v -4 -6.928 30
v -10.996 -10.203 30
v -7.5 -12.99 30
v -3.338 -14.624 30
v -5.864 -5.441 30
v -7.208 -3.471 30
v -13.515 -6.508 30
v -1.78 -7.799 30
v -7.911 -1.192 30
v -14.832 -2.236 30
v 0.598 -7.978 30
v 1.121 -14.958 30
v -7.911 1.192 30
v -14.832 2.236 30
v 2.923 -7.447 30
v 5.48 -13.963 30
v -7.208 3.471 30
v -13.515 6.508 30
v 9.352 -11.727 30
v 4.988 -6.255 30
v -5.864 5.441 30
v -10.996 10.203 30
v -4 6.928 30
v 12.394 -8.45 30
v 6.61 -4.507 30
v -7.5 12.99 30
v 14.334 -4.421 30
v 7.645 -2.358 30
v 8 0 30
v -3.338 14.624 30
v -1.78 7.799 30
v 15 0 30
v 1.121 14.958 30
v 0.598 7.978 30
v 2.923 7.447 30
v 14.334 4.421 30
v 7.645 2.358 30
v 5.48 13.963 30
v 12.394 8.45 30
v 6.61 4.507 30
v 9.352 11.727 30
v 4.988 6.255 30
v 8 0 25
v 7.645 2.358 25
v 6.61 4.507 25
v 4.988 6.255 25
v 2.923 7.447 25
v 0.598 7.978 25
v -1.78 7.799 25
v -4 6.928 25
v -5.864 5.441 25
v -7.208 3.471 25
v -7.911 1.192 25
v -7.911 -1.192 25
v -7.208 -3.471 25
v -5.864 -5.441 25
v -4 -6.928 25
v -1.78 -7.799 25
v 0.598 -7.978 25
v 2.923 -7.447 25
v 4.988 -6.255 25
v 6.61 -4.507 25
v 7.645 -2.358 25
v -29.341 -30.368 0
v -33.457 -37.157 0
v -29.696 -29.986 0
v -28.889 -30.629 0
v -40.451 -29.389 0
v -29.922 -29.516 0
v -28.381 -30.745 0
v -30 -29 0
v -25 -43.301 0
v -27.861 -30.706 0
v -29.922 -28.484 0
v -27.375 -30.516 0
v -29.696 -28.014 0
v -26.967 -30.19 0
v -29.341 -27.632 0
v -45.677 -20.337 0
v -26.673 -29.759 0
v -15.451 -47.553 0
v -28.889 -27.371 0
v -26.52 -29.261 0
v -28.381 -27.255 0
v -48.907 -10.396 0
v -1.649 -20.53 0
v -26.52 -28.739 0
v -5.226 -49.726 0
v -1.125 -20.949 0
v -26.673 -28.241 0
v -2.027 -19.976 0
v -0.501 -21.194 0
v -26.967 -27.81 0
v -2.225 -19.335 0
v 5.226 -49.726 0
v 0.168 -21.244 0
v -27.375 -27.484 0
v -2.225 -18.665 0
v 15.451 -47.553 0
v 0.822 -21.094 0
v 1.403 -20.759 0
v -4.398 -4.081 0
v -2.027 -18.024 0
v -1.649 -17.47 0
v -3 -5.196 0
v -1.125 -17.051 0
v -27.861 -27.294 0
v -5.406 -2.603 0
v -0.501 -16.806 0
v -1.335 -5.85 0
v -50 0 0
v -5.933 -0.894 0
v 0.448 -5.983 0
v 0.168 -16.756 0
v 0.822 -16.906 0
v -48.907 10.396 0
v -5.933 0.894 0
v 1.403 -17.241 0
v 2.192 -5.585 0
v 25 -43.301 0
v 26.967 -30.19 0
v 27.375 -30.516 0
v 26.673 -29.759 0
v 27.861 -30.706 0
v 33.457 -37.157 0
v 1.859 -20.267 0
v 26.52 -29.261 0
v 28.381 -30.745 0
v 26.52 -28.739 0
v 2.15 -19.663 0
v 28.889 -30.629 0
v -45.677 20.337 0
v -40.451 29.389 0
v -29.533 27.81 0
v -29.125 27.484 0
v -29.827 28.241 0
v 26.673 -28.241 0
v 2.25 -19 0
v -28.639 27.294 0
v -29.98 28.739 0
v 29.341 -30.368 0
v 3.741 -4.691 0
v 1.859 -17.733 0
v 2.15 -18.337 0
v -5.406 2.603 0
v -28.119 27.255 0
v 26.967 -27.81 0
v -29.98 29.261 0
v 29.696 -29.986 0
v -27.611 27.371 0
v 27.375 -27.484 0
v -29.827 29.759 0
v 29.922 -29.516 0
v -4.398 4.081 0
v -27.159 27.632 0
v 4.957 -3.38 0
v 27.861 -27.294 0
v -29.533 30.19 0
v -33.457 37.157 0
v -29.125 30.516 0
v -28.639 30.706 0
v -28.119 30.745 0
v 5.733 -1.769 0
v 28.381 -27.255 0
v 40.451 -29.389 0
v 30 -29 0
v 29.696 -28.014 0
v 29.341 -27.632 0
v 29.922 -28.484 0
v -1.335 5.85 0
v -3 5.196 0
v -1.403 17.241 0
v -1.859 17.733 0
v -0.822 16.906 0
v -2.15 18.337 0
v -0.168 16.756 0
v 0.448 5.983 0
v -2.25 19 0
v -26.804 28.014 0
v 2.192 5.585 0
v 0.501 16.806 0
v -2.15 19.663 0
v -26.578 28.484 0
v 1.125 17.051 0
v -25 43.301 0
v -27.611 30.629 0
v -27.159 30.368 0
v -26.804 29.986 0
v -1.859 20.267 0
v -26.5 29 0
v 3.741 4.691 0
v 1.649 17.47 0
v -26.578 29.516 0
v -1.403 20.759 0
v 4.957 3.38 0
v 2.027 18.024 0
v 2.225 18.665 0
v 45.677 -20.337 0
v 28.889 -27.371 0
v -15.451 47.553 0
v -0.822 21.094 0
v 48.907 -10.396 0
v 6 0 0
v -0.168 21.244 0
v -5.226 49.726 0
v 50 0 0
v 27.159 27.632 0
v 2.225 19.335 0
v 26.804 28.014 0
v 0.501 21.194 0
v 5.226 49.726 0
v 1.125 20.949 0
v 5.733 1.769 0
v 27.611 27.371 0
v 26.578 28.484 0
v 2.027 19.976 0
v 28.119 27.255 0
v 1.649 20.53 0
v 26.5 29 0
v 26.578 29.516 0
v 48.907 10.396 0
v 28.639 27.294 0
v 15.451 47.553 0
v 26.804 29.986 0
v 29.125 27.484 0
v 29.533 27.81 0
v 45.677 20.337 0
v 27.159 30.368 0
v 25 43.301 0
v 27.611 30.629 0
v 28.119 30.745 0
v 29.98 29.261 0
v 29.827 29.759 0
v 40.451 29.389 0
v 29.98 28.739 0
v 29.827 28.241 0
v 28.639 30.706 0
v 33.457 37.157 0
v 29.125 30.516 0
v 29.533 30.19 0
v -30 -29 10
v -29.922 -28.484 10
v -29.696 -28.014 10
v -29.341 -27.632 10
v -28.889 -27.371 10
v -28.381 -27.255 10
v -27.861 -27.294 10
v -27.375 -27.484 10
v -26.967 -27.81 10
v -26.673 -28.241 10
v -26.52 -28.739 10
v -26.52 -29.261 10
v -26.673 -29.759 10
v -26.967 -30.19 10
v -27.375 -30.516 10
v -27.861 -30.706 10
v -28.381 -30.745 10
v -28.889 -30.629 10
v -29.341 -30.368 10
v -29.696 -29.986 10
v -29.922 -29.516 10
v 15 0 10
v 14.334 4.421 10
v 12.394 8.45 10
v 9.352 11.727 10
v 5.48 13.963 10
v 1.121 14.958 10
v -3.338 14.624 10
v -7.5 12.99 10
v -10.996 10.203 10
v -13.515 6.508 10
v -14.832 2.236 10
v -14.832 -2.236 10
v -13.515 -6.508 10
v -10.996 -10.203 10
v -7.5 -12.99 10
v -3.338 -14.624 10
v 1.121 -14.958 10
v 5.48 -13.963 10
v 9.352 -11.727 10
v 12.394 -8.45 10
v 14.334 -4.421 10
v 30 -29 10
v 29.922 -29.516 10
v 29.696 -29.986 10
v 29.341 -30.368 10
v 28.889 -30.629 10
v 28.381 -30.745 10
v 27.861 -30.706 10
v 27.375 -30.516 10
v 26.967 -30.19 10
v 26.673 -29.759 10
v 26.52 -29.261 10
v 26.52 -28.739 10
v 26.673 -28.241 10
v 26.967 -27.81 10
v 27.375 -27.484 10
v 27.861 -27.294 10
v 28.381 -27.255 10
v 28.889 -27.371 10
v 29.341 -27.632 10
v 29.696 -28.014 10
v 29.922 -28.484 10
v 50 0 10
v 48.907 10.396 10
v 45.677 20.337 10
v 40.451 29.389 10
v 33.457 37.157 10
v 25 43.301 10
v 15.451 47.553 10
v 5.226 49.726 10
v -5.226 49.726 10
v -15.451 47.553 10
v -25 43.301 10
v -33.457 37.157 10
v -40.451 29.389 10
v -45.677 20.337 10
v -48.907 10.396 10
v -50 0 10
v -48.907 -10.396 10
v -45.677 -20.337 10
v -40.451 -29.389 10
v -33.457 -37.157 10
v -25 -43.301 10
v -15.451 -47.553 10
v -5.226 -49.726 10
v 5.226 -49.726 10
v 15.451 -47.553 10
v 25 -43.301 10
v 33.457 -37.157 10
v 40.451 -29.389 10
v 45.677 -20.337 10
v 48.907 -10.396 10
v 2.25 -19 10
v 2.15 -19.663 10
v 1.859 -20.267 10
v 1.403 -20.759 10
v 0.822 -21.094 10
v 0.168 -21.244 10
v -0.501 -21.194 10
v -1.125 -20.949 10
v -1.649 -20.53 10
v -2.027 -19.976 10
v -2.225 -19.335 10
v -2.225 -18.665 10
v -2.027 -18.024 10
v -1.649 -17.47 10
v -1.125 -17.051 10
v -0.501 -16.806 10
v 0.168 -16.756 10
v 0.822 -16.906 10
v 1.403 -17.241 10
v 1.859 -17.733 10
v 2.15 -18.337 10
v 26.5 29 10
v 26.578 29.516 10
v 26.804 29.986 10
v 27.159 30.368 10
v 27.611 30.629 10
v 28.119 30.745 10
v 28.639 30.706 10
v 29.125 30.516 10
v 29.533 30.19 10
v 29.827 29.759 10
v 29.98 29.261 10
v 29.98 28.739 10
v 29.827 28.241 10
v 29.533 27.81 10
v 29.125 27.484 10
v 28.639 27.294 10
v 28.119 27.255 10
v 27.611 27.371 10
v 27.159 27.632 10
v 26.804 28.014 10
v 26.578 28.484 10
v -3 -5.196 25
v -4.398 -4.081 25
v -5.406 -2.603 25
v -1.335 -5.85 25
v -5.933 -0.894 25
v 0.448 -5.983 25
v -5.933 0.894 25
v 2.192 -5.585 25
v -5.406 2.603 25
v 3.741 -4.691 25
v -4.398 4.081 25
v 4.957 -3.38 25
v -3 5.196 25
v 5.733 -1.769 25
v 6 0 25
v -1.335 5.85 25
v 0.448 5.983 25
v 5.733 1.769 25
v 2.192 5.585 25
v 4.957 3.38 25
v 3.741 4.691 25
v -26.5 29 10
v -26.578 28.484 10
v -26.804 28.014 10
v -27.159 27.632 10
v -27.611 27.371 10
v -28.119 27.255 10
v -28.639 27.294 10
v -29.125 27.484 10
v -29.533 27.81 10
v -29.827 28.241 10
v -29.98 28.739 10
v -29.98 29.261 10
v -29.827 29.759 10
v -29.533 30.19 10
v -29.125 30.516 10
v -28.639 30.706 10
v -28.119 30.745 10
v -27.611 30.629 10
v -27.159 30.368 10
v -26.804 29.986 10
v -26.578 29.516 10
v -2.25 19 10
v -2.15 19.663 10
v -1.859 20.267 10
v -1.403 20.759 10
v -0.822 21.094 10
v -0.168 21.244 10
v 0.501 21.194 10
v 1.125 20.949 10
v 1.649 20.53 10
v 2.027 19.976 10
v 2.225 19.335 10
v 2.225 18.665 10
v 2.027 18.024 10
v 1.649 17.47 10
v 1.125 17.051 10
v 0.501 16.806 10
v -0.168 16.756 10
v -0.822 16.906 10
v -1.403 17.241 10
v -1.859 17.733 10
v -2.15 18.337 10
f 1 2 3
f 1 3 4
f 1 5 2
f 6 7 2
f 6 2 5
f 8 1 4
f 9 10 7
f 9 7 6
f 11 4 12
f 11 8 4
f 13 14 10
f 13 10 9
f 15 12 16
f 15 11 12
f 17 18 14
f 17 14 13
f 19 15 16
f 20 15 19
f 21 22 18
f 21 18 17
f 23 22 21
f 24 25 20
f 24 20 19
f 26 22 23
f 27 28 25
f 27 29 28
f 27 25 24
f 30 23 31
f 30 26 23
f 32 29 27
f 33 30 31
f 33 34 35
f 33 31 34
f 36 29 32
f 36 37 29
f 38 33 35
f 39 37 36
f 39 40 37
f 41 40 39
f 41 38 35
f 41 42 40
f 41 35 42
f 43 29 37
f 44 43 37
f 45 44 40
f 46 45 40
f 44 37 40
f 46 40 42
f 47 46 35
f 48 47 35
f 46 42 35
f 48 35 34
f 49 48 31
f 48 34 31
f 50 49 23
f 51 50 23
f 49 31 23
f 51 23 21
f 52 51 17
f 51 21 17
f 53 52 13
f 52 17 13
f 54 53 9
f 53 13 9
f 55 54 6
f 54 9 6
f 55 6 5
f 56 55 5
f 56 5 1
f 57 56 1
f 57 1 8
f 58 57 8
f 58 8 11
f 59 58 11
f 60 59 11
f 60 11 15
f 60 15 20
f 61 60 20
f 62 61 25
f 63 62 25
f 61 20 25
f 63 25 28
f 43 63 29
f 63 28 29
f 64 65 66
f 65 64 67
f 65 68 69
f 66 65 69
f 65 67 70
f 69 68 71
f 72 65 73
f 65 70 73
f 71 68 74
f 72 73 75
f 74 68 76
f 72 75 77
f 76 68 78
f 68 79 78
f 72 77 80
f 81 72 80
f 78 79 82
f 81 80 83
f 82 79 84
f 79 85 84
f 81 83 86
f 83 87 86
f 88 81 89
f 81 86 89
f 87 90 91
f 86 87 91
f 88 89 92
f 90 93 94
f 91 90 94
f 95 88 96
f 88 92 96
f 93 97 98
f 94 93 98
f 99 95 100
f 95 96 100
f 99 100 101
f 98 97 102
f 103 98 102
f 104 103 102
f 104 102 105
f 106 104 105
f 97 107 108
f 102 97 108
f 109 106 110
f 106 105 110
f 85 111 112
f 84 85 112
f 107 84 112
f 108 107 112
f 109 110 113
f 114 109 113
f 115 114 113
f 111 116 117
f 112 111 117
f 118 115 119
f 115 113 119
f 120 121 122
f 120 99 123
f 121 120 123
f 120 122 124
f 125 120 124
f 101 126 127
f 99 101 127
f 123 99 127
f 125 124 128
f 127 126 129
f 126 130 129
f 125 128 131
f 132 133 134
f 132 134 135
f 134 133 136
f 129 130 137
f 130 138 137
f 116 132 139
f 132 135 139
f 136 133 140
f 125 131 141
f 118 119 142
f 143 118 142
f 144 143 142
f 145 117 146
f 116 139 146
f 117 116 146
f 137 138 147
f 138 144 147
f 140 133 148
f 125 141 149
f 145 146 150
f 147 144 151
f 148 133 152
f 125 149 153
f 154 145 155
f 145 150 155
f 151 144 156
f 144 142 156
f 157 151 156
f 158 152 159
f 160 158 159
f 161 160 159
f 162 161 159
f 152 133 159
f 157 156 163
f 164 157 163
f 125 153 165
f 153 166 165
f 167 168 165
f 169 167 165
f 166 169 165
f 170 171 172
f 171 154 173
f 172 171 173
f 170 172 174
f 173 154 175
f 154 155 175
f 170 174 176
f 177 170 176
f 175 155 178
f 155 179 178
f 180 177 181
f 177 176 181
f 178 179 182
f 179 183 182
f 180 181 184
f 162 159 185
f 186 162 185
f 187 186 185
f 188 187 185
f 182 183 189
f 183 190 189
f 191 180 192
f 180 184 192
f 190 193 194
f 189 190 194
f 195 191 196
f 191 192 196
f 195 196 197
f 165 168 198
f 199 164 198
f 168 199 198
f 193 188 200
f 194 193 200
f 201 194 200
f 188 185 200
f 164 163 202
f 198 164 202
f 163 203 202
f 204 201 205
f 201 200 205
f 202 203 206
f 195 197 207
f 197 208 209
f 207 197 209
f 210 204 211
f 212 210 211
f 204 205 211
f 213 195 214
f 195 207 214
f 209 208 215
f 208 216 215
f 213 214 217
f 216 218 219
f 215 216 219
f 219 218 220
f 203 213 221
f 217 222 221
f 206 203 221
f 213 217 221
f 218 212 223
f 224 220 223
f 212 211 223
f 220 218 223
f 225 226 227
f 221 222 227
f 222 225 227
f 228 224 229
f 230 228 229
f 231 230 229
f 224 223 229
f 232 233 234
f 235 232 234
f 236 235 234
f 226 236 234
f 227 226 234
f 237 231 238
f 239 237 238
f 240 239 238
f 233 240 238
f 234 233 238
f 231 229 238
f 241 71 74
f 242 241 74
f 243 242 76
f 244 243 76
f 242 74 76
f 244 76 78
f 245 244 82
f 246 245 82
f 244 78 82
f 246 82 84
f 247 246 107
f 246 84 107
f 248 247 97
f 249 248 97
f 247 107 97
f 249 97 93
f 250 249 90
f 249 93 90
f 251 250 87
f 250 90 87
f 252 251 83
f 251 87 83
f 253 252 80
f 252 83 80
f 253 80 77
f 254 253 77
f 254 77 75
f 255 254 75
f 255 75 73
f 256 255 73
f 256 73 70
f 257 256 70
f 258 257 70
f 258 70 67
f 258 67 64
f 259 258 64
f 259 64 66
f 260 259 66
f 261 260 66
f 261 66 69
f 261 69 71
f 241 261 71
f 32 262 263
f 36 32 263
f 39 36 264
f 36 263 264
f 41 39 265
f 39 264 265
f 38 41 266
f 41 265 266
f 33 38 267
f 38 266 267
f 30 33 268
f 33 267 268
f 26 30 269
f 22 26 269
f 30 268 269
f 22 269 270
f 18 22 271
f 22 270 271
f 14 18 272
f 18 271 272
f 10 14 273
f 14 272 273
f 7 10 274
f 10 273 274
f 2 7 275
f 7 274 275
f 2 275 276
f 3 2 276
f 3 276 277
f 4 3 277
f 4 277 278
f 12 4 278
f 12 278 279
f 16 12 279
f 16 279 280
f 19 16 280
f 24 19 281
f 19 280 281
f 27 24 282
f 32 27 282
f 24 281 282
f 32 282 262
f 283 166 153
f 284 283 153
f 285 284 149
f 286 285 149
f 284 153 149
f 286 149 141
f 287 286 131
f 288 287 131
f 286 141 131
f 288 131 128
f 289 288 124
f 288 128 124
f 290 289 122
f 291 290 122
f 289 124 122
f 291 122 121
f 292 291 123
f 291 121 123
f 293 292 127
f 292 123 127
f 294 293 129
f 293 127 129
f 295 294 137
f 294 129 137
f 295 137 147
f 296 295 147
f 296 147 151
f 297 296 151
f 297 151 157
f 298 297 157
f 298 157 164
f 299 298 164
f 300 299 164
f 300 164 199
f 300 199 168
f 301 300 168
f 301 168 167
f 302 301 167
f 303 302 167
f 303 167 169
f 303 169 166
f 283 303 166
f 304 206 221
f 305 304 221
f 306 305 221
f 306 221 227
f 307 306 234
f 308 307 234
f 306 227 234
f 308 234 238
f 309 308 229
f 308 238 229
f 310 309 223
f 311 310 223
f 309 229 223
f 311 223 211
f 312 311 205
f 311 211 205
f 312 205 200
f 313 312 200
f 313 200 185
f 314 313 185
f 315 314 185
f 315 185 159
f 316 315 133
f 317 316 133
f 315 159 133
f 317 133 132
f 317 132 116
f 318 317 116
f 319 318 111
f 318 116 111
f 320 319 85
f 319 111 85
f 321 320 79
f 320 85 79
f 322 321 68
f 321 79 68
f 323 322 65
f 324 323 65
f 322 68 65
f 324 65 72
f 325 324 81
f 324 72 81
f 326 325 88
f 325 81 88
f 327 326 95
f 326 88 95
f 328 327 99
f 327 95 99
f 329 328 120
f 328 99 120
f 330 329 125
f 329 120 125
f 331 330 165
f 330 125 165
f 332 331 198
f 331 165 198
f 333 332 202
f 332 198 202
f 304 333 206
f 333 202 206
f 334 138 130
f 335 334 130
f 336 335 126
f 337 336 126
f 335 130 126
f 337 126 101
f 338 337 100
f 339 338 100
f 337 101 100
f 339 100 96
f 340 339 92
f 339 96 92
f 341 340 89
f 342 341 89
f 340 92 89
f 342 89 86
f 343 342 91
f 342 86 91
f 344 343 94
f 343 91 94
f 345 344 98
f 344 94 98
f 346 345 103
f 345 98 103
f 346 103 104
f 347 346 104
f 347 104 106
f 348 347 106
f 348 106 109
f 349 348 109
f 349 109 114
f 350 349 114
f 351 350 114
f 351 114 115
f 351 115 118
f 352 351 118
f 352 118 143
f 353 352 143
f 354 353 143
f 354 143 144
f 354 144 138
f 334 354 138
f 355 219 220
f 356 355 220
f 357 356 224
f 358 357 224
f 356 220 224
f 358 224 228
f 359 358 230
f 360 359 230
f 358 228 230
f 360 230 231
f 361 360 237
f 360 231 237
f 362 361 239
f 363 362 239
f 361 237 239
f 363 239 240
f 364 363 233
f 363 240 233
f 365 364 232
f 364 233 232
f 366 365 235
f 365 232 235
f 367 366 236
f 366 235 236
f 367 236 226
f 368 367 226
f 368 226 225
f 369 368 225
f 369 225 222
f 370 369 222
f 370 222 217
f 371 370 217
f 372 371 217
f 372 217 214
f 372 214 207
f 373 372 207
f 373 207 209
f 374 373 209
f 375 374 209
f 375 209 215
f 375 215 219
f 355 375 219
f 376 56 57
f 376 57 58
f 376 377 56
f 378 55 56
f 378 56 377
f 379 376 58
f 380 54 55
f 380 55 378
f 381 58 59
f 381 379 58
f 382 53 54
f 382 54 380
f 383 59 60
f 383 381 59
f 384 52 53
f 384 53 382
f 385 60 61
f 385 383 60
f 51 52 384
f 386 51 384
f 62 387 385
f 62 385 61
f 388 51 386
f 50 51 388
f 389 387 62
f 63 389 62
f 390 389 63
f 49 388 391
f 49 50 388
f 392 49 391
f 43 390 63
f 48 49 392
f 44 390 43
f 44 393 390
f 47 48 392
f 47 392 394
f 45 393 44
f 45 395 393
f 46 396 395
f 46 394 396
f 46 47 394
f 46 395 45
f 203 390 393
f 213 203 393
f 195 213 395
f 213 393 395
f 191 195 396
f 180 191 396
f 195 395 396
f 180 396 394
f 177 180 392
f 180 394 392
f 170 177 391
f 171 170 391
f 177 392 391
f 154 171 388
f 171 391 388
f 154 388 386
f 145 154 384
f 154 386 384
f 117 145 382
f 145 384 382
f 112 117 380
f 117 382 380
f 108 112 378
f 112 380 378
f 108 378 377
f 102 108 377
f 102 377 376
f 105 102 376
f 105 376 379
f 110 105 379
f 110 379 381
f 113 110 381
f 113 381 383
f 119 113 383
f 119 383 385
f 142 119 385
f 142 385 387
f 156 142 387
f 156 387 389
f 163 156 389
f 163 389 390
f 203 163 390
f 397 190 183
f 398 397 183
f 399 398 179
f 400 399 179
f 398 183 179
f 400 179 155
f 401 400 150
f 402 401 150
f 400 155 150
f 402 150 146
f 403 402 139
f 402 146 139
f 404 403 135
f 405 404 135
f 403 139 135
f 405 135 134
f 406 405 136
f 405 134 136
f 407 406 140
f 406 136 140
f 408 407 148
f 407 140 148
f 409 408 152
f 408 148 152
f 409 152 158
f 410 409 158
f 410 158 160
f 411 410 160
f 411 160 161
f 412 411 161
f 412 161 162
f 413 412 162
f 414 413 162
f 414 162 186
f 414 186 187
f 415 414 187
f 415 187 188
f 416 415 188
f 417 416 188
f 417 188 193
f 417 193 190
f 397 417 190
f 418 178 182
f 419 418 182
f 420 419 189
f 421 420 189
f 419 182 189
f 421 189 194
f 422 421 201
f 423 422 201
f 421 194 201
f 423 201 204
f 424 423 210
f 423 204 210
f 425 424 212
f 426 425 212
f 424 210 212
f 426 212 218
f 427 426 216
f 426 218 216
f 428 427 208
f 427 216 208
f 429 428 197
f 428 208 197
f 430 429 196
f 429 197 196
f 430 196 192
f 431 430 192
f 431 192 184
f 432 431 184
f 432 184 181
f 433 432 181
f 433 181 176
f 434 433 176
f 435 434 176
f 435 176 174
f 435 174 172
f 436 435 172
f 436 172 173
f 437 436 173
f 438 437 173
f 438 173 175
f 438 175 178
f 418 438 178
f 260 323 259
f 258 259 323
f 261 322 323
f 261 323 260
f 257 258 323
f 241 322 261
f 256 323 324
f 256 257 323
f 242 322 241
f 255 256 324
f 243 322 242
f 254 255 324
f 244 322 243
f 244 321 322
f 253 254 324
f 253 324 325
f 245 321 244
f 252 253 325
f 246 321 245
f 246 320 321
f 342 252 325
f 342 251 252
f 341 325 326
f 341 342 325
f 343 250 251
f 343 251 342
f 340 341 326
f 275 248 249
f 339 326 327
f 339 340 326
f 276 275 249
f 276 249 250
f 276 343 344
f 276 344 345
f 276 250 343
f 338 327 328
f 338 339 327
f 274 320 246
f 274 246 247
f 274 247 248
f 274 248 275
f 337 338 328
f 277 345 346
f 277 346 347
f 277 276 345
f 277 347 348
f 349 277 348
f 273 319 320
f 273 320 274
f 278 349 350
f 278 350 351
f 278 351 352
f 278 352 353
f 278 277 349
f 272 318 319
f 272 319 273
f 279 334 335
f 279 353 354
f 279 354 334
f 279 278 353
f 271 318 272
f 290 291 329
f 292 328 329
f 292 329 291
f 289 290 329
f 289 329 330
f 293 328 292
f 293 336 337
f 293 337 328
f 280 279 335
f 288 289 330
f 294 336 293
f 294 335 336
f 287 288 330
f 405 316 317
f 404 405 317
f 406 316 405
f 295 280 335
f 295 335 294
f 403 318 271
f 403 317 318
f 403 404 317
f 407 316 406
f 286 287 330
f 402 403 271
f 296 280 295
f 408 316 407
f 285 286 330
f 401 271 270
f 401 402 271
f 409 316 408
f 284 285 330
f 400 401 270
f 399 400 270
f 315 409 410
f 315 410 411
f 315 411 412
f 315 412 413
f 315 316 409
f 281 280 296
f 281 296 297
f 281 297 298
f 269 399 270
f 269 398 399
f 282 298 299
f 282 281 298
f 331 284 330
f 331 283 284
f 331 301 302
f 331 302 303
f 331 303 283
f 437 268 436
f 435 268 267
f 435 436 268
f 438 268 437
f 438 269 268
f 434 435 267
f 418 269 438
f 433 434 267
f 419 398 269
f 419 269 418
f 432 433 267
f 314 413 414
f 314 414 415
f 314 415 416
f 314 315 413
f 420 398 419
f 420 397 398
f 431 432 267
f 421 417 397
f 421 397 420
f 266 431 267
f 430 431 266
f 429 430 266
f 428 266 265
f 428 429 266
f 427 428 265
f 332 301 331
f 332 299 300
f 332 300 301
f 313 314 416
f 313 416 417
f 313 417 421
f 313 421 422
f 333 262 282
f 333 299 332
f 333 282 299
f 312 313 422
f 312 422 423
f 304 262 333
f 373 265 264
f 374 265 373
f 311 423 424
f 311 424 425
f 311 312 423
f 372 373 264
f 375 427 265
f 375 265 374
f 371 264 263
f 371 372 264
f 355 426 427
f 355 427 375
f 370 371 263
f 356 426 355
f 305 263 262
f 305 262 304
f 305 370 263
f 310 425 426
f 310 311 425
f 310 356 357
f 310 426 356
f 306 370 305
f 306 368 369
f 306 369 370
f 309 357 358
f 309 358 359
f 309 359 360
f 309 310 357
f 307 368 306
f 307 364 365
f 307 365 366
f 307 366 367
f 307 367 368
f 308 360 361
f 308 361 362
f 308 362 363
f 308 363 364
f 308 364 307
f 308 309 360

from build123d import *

# Parameters (mm, degrees)
SKETCH1_R           = 50
BOSS_EXTRUDE1_DEPTH = 10
SKETCH2_R           = 15
BOSS_EXTRUDE2_DEPTH = 20
SKETCH5_R           = 8
CUT_EXTRUDE2_DEPTH  = 5
SKETCH6_R           = 6
CUT_EXTRUDE3_DEPTH  = 76
SKETCH7_R           = 1.75
CUT_EXTRUDE4_DEPTH  = 77.811457479
SKETCH8_R           = 2.25
CUT_EXTRUDE5_DEPTH  = 77.811457479


with BuildPart() as part:
    # Sketch1 → Boss-Extrude1 (new body)
    with BuildSketch(Plane.XY):
        Circle(SKETCH1_R)
    extrude(amount=BOSS_EXTRUDE1_DEPTH)

    # Sketch2 → Boss-Extrude2 (add)
    with BuildSketch(Plane.XY.offset(10)):
        Circle(SKETCH2_R)
    extrude(amount=BOSS_EXTRUDE2_DEPTH)

    # Sketch5 → Cut-Extrude2 (cut)
    with BuildSketch(Plane.XY.offset(30)):
        Circle(SKETCH5_R)
    extrude(amount=-CUT_EXTRUDE2_DEPTH, mode=Mode.SUBTRACT)

    # Sketch6 → Cut-Extrude3 (cut, through all)
    with BuildSketch(Plane.XY.offset(25)):
        Circle(SKETCH6_R)
    extrude(amount=-CUT_EXTRUDE3_DEPTH, mode=Mode.SUBTRACT)

    # Sketch7 → Cut-Extrude4 (cut, through all)
    with BuildSketch(Plane(origin=(0, 0, 0), x_dir=(-1, 0, 0), z_dir=(0, 0, -1))):
        with Locations((-28.25, 29)):
            Circle(SKETCH7_R)
        with Locations(Location((28.25, 29, 0), (0, 0, 180))):
            Circle(SKETCH7_R)
        with Locations((28.25, -29)):
            Circle(SKETCH7_R)
        with Locations(Location((-28.25, -29, 0), (0, 0, 180))):
            Circle(SKETCH7_R)
    extrude(amount=-CUT_EXTRUDE4_DEPTH, mode=Mode.SUBTRACT)

    # Sketch8 → Cut-Extrude5 (cut, through all)
    with BuildSketch(Plane(origin=(0, 0, 0), x_dir=(-1, 0, 0), z_dir=(0, 0, -1))):
        with Locations((0, 19)):
            Circle(SKETCH8_R)
        with Locations(Location((0, -19, 0), (0, 0, 180))):
            Circle(SKETCH8_R)
    extrude(amount=-CUT_EXTRUDE5_DEPTH, mode=Mode.SUBTRACT)


solid = part.part
